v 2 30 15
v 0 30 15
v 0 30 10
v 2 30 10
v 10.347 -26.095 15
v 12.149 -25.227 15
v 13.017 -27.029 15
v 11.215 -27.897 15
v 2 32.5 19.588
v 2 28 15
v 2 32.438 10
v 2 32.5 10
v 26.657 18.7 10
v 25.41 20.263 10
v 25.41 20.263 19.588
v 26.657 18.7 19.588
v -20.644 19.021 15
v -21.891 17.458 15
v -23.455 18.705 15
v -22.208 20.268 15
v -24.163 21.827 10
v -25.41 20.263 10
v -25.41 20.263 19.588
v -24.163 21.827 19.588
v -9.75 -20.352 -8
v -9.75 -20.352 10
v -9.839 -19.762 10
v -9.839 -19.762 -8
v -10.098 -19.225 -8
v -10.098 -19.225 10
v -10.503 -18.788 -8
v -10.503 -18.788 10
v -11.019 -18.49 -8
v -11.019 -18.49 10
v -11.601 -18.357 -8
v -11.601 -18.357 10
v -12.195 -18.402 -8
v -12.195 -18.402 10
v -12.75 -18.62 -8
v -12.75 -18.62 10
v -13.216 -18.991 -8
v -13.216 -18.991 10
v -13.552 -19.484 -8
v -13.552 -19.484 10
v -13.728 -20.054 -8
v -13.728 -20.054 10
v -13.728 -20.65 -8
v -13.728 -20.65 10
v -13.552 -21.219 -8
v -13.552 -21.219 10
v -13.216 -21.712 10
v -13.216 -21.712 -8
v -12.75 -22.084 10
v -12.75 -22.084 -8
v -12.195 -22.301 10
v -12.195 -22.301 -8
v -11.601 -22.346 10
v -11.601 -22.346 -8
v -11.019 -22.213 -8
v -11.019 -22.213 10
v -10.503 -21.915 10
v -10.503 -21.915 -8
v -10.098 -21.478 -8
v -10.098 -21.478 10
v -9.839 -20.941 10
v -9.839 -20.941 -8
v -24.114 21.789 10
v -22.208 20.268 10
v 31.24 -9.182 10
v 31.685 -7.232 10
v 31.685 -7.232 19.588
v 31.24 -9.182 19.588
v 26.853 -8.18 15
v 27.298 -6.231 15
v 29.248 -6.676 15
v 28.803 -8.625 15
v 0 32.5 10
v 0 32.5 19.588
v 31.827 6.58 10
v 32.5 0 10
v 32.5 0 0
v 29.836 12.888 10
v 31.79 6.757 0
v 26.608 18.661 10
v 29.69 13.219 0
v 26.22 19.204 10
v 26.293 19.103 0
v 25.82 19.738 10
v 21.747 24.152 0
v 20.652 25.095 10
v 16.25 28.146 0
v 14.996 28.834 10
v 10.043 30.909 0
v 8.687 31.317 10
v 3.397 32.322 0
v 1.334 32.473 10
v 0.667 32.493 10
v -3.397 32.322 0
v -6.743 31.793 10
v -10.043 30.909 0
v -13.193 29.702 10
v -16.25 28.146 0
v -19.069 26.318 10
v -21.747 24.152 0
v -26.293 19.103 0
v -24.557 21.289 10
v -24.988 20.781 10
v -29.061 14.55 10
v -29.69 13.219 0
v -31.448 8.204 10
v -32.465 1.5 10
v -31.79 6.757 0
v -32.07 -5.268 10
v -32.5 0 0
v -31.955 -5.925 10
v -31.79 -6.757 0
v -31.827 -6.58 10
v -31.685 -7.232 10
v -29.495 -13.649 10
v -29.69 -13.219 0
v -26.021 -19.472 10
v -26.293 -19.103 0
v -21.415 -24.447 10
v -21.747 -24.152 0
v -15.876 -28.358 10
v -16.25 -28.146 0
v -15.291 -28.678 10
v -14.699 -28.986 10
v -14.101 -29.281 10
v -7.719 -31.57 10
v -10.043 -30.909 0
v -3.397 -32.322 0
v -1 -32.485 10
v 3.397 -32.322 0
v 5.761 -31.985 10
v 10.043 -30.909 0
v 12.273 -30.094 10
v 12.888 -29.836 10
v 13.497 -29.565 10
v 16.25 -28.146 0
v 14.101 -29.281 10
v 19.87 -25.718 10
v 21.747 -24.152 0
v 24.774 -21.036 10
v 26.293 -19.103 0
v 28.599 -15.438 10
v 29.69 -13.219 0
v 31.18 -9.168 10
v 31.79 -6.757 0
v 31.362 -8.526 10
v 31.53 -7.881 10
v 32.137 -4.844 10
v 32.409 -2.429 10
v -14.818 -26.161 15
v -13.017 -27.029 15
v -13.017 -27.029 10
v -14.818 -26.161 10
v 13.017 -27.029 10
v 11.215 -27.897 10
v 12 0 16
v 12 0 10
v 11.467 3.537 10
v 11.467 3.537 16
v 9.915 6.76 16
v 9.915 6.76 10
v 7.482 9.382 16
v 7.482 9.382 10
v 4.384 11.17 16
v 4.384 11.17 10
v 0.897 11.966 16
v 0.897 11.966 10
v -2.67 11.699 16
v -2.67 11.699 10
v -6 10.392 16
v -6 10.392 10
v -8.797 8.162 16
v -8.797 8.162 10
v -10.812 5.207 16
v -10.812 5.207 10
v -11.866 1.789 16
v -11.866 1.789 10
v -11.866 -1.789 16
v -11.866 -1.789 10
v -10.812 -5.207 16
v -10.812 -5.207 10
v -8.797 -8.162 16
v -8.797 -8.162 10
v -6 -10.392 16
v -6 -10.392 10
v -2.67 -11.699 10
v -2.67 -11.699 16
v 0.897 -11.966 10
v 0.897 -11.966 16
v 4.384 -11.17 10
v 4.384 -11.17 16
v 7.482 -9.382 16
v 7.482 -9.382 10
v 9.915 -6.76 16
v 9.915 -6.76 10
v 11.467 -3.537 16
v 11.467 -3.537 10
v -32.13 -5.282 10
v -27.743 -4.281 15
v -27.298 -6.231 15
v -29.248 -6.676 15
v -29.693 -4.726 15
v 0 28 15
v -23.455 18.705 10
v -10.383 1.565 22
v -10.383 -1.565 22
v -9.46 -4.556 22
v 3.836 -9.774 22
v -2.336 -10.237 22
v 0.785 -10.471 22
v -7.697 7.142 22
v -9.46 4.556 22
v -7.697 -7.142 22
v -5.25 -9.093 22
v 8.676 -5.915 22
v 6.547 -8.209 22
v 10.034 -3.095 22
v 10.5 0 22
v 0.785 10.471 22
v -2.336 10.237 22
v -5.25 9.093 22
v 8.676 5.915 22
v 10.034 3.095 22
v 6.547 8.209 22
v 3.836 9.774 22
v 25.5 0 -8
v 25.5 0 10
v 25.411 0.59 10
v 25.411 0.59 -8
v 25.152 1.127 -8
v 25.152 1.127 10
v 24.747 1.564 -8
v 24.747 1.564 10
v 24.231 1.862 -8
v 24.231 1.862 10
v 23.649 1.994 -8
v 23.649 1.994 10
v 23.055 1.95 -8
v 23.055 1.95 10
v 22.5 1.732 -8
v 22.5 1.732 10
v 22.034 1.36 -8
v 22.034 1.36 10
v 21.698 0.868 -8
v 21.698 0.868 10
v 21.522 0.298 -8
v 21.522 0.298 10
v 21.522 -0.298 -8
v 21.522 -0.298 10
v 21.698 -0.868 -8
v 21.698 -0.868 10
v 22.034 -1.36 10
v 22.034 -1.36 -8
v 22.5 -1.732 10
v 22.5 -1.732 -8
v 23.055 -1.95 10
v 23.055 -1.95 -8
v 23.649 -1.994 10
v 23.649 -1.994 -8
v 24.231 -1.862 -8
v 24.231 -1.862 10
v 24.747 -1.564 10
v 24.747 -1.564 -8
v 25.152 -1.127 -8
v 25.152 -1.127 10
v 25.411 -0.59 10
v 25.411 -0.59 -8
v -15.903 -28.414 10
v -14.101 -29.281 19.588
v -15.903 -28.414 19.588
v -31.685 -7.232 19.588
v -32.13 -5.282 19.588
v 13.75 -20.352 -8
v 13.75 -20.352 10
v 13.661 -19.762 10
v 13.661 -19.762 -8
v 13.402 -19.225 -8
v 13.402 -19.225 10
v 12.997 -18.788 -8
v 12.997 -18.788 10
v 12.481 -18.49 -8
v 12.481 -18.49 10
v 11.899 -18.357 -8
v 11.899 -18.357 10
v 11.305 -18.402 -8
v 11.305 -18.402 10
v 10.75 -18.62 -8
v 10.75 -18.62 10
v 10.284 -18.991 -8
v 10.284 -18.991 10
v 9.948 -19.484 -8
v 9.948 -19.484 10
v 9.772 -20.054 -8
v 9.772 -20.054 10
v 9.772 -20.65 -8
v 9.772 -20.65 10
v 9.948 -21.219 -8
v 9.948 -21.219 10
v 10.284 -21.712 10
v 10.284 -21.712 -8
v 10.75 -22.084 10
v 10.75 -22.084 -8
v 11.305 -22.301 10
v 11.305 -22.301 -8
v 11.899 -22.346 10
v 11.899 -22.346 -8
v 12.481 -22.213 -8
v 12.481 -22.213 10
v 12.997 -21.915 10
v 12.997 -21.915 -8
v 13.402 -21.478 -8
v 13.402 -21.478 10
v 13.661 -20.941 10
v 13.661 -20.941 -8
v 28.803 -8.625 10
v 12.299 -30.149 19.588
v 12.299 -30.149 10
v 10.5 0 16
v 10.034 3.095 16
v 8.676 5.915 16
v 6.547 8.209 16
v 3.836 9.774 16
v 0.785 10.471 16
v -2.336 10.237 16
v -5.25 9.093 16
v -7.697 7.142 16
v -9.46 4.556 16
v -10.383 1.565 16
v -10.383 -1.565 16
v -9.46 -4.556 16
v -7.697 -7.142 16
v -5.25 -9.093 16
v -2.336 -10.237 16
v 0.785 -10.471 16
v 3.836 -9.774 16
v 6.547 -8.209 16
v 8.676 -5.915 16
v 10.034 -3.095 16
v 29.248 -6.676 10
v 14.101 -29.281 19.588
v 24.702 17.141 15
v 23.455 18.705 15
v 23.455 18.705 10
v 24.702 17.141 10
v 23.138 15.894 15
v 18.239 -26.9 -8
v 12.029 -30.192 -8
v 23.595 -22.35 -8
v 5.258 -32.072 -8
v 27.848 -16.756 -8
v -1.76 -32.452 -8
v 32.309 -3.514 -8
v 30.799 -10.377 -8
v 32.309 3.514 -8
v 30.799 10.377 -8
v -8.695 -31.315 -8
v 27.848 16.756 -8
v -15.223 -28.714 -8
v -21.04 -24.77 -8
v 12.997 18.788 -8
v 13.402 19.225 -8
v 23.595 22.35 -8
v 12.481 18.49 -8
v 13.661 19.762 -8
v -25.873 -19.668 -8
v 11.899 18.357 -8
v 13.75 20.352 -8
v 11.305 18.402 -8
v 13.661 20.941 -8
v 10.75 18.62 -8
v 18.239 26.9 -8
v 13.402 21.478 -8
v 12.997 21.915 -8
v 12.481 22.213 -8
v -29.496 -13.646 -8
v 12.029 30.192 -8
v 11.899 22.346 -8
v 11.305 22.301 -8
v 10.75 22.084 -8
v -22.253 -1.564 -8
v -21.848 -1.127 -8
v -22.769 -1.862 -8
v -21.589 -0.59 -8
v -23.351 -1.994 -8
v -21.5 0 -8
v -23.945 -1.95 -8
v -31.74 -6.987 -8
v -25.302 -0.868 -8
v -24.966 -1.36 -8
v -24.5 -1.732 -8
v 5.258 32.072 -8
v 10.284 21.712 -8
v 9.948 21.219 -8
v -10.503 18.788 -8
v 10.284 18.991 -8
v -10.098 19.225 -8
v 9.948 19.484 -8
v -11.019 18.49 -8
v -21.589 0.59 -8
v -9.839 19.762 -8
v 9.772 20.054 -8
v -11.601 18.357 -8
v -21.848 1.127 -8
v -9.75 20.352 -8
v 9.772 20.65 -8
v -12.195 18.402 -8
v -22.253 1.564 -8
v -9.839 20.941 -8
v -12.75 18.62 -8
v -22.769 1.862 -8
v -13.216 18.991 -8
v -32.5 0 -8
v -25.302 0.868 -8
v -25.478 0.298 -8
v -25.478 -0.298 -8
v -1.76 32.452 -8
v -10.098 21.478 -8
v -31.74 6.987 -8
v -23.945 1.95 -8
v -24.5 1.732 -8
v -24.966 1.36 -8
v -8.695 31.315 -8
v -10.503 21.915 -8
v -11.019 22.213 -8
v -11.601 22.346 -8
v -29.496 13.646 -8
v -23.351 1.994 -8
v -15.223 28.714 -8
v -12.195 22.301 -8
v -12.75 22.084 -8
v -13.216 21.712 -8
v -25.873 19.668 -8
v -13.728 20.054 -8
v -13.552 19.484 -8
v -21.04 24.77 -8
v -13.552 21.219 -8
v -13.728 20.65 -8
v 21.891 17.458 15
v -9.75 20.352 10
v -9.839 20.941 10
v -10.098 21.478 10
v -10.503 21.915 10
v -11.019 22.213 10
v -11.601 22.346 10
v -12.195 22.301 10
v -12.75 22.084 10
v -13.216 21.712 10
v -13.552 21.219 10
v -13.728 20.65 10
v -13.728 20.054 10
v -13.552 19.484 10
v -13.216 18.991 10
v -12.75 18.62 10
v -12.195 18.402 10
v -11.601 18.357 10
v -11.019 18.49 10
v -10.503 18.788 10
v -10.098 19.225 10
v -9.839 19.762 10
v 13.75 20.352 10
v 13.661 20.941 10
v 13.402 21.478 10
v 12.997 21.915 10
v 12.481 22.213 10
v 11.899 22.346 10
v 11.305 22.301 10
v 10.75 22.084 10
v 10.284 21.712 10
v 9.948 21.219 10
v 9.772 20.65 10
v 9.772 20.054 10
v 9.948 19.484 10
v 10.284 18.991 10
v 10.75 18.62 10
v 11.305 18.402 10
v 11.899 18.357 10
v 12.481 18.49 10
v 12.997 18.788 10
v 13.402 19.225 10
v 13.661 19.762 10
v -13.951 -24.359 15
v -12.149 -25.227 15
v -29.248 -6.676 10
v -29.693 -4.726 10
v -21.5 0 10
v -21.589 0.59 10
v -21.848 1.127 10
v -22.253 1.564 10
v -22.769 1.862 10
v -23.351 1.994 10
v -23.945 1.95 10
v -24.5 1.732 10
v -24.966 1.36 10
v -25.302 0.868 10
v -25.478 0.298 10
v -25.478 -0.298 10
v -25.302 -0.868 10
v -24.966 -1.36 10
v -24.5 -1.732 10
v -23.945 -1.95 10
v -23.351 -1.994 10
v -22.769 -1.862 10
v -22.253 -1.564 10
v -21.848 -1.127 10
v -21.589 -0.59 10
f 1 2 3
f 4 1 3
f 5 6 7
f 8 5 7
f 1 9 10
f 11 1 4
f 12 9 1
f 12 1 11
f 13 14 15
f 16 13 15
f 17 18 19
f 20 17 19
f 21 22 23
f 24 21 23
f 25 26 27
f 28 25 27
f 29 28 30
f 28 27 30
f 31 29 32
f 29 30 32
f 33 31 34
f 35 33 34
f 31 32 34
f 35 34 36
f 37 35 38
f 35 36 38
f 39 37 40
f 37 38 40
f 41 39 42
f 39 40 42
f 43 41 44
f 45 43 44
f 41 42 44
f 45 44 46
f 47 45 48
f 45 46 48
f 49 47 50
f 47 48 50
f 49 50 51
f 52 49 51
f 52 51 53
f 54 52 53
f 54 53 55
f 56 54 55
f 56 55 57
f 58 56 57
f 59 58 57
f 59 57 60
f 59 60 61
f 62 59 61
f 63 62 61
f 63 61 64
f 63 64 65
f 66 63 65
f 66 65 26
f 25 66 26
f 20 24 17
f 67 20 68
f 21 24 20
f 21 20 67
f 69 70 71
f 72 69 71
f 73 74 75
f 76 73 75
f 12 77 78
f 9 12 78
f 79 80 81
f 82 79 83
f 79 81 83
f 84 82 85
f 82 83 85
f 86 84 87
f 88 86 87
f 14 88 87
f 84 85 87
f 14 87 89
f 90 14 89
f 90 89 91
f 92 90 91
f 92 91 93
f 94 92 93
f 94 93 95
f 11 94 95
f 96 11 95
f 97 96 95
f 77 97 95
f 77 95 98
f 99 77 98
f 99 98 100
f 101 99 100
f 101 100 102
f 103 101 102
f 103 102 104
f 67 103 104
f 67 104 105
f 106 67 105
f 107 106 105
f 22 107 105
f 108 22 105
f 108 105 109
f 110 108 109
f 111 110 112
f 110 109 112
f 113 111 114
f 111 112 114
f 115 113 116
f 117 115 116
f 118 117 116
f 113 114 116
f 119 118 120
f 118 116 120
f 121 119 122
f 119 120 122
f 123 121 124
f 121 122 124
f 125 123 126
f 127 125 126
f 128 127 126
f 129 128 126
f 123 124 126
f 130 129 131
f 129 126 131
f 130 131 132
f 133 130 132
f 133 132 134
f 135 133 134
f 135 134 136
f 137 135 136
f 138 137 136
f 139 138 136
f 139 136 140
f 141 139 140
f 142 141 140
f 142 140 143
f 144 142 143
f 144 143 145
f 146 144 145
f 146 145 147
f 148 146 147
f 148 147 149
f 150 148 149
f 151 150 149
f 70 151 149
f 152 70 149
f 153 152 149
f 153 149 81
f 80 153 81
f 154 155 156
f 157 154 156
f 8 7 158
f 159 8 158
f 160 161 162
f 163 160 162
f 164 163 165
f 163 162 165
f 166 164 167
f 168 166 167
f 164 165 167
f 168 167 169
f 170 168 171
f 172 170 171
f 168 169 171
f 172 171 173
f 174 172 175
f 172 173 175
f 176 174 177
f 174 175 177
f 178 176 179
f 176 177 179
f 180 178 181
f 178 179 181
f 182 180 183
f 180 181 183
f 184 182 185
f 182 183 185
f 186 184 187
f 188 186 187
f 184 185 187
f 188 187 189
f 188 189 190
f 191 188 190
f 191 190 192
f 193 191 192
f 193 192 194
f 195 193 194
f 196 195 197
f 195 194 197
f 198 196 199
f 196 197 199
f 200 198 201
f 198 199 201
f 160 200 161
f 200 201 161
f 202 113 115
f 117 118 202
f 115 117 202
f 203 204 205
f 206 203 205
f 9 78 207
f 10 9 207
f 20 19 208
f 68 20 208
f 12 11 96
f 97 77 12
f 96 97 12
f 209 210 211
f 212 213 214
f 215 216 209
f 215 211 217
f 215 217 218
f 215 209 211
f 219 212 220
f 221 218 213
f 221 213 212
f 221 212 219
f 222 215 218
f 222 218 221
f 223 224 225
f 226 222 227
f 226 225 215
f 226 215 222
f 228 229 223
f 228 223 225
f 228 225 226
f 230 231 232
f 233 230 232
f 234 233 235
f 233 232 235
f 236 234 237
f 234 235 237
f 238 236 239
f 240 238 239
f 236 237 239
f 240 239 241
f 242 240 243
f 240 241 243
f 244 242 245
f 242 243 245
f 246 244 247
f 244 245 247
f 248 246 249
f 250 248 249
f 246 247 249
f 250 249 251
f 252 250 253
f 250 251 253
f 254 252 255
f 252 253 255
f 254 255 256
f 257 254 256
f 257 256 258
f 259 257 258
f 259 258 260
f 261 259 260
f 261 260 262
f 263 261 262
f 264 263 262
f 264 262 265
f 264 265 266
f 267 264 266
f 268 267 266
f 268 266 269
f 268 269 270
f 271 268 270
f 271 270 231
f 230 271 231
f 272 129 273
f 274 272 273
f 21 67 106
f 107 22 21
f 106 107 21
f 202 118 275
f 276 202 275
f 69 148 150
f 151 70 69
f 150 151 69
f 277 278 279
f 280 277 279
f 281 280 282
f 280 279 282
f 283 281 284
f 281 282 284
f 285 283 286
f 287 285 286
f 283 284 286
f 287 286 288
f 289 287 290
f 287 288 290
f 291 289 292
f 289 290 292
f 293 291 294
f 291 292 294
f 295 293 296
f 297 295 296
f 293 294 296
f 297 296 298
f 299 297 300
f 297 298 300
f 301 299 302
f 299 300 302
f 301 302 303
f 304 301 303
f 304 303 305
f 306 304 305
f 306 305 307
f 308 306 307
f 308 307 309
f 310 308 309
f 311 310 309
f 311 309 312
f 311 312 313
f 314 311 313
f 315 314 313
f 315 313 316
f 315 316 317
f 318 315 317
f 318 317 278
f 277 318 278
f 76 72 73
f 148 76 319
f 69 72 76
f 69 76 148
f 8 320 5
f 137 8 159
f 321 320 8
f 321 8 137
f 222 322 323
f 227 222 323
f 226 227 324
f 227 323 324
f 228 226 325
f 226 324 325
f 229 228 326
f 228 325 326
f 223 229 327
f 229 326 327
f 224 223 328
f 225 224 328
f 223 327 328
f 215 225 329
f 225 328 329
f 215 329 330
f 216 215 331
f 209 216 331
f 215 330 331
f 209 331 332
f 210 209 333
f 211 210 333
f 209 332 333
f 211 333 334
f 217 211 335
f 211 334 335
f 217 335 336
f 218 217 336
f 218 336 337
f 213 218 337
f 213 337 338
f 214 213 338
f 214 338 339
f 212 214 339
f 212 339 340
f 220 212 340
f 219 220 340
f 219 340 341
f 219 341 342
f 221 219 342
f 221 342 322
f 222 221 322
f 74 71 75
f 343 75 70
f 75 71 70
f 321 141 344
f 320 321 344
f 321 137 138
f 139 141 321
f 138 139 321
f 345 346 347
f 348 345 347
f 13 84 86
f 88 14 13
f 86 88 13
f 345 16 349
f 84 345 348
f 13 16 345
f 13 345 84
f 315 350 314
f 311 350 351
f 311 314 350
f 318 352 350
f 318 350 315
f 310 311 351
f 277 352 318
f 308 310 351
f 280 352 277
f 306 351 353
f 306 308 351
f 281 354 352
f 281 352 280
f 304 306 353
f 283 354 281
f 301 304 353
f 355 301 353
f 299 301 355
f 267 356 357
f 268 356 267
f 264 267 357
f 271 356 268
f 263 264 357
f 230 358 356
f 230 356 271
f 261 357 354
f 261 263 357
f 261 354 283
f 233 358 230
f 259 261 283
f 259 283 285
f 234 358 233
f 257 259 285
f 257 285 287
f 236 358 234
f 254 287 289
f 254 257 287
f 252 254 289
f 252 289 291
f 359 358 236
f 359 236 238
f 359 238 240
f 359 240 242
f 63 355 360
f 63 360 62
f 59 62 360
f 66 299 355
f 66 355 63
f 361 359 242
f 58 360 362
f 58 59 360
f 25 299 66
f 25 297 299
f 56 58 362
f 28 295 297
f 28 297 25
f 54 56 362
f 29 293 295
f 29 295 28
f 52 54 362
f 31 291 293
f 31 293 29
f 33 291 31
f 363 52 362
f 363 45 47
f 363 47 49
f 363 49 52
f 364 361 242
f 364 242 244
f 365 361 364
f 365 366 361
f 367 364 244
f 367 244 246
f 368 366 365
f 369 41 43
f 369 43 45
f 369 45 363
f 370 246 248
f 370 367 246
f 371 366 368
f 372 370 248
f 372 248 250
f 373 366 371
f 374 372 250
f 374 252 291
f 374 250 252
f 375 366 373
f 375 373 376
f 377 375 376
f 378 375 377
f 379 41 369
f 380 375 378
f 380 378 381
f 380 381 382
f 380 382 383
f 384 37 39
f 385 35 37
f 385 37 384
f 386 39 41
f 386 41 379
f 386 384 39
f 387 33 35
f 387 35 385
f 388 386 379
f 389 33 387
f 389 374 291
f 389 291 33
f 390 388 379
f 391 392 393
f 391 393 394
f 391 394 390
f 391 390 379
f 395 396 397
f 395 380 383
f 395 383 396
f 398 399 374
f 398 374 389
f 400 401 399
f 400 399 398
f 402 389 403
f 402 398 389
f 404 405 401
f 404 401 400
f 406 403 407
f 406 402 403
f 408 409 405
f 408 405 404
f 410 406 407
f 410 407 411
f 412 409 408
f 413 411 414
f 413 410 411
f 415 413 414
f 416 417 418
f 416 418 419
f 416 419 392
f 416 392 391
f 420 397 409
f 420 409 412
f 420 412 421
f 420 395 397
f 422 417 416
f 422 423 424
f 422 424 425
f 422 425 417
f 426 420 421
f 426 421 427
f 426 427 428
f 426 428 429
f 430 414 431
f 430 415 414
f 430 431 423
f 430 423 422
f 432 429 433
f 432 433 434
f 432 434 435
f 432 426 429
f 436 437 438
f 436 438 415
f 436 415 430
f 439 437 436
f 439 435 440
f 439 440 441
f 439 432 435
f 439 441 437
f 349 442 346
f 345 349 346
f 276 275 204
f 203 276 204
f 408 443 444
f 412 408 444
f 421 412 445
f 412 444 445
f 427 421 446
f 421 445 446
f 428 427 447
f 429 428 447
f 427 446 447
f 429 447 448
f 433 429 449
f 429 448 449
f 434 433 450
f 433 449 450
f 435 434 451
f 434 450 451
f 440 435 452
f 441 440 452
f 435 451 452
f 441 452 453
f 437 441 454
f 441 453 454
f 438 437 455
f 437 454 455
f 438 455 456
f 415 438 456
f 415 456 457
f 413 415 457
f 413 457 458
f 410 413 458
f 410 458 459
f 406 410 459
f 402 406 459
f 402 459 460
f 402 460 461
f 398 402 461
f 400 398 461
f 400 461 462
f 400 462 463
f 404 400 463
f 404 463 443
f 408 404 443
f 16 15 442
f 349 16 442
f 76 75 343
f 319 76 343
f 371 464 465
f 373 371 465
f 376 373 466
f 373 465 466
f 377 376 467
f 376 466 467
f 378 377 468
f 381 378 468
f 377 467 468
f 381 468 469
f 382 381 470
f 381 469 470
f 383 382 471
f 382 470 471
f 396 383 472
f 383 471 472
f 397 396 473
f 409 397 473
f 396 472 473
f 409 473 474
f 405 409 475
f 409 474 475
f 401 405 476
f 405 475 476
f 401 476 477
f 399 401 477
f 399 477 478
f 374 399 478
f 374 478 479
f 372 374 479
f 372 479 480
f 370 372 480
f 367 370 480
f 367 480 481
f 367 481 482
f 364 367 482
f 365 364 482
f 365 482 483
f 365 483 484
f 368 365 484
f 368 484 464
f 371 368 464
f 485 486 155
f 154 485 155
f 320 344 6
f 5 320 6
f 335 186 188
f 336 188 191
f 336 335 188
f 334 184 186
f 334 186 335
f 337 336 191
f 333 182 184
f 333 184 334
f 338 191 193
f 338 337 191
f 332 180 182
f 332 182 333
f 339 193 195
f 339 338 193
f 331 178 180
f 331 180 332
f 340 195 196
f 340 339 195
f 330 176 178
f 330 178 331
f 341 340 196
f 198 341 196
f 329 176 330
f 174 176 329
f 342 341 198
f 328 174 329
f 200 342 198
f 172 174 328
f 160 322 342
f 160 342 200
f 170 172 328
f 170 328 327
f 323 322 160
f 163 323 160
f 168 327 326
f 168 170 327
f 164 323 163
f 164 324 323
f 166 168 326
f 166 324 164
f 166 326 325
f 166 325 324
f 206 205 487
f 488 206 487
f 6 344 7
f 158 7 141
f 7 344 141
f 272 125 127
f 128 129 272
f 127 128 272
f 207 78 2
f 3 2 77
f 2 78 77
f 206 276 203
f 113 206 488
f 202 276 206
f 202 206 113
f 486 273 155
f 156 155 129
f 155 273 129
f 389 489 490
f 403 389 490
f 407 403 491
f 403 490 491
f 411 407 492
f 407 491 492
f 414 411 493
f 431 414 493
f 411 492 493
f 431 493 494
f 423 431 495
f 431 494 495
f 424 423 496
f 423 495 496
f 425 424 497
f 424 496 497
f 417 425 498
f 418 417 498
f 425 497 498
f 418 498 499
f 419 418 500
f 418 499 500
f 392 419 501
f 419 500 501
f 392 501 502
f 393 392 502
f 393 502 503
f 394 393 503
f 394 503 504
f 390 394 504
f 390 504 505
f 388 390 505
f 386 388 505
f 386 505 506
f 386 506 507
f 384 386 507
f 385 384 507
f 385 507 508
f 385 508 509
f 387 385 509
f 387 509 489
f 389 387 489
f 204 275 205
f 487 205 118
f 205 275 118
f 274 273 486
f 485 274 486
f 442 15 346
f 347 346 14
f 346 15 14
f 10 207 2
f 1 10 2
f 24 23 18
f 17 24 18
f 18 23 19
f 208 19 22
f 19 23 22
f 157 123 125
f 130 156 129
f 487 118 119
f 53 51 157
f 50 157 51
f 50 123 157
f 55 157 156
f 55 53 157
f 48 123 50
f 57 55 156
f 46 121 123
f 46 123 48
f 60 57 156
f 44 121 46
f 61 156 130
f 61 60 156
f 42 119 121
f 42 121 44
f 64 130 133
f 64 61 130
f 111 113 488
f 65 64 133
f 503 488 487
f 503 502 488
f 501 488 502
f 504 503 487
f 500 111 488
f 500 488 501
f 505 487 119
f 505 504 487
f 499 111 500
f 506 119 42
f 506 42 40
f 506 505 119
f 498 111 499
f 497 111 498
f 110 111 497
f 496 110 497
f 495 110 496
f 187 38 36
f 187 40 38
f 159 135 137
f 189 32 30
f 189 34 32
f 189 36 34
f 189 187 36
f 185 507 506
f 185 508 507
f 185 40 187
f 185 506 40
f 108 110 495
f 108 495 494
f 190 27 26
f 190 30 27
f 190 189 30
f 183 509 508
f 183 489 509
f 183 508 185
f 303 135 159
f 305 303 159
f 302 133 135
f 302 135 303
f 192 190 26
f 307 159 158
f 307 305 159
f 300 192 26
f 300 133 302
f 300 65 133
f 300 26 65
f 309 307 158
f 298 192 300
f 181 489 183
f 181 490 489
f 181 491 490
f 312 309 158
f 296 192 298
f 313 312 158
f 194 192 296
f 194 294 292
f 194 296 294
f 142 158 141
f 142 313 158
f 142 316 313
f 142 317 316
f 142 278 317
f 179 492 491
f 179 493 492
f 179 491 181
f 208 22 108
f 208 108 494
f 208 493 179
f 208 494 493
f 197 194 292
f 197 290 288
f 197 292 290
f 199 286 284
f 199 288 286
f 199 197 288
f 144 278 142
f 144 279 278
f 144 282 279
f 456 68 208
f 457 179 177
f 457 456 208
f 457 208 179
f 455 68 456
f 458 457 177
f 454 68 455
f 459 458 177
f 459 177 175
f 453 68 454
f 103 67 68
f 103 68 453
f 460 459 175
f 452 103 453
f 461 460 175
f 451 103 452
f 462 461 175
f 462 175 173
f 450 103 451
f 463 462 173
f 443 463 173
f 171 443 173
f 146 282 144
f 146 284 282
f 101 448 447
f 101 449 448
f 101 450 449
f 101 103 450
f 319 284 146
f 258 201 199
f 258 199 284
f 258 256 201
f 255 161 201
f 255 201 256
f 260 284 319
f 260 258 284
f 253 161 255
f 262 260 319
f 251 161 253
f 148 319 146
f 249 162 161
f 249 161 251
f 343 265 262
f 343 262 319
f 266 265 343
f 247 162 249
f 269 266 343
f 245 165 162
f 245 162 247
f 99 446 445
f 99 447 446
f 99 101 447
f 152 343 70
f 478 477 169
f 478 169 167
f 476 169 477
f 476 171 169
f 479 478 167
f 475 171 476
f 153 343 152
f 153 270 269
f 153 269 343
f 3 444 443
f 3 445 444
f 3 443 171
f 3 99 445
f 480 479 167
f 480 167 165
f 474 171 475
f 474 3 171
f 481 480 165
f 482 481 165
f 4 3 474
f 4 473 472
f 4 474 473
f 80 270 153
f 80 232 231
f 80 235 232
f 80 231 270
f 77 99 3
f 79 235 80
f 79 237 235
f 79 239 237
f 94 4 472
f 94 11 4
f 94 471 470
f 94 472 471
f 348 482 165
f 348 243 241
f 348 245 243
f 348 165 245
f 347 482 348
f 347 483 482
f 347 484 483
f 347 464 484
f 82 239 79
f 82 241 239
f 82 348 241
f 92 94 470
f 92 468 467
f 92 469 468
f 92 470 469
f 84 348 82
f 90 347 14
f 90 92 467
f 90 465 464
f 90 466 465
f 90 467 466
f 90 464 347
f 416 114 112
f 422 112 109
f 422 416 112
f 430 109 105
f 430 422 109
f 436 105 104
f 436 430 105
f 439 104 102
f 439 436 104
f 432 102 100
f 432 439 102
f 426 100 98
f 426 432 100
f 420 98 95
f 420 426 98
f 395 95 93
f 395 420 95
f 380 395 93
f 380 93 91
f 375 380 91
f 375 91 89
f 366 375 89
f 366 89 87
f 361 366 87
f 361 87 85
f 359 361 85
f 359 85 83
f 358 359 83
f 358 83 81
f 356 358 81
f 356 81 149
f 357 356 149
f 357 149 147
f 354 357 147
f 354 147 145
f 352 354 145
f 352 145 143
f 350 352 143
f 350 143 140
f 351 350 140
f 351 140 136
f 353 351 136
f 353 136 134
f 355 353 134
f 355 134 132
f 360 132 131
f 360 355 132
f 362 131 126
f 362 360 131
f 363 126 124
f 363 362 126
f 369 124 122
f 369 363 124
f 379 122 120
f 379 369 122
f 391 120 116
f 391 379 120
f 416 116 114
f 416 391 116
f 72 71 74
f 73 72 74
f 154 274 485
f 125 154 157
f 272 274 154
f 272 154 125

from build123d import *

# Parameters (mm, degrees)
SKETCH2_R           = 32.5
BOSS_EXTRUDE1_DEPTH = 10
BOSS_EXTRUDE2_DEPTH = 2
CIRPATTERN1_COUNT   = 7
SKETCH4_R           = 12
BOSS_EXTRUDE3_DEPTH = 6
SKETCH5_R           = 10.5
BOSS_EXTRUDE4_DEPTH = 12
BOSS_EXTRUDE5_START = 8
SKETCH7_R           = 32.5
BOSS_EXTRUDE5_DEPTH = 8
SKETCH6_R           = 2
CUT_EXTRUDE1_DEPTH  = 50.360915713


with BuildPart() as part:
    # Sketch2 → Boss-Extrude1 (new body)
    with BuildSketch(Plane.XY):
        Circle(SKETCH2_R)
    extrude(amount=BOSS_EXTRUDE1_DEPTH)

    # Sketch3 → Boss-Extrude2 (add)
    with BuildSketch(Plane(origin=(0, 0, 0), x_dir=(0, 0, -1), z_dir=(1, 0, 0))):
        Polygon((-10, 32.5), (-19.587933614, 32.5), (-15, 28), (-15, 30), (-10, 30), align=None)
    boss_extrude2 = extrude(amount=BOSS_EXTRUDE2_DEPTH)

    # CirPattern1: Boss-Extrude2 ×7 about axis
    cirpattern1_axis = Axis((0, 0, 0), (0, 0, 1))
    for i in range(1, CIRPATTERN1_COUNT):
        add(boss_extrude2.rotate(cirpattern1_axis, i * 360 / CIRPATTERN1_COUNT))

    # Sketch4 → Boss-Extrude3 (add)
    with BuildSketch(Plane.XY.offset(10)):
        Circle(SKETCH4_R)
    extrude(amount=BOSS_EXTRUDE3_DEPTH)

    # Sketch5 → Boss-Extrude4 (add)
    with BuildSketch(Plane.XY.offset(10)):
        Circle(SKETCH5_R)
    extrude(amount=BOSS_EXTRUDE4_DEPTH)

    # Sketch7 → Boss-Extrude5 (add)
    with BuildSketch(Plane(origin=(0, 0, 0), x_dir=(-1, 0, 0), z_dir=(0, 0, -1)).offset(BOSS_EXTRUDE5_START)):
        Circle(SKETCH7_R)
    extrude(amount=-BOSS_EXTRUDE5_DEPTH)

    # Sketch6 → Cut-Extrude1 (cut, through all)
    with BuildSketch(Plane.XY.offset(10)):
        with Locations((23.5, 0)):
            Circle(SKETCH6_R)
        with Locations((11.75, -20.351596989)):
            Circle(SKETCH6_R)
        with Locations((-11.75, -20.351596989)):
            Circle(SKETCH6_R)
        with Locations((-23.5, 0)):
            Circle(SKETCH6_R)
        with Locations((-11.75, 20.351596989)):
            Circle(SKETCH6_R)
        with Locations((11.75, 20.351596989)):
            Circle(SKETCH6_R)
    extrude(amount=-CUT_EXTRUDE1_DEPTH, mode=Mode.SUBTRACT)


solid = part.part
